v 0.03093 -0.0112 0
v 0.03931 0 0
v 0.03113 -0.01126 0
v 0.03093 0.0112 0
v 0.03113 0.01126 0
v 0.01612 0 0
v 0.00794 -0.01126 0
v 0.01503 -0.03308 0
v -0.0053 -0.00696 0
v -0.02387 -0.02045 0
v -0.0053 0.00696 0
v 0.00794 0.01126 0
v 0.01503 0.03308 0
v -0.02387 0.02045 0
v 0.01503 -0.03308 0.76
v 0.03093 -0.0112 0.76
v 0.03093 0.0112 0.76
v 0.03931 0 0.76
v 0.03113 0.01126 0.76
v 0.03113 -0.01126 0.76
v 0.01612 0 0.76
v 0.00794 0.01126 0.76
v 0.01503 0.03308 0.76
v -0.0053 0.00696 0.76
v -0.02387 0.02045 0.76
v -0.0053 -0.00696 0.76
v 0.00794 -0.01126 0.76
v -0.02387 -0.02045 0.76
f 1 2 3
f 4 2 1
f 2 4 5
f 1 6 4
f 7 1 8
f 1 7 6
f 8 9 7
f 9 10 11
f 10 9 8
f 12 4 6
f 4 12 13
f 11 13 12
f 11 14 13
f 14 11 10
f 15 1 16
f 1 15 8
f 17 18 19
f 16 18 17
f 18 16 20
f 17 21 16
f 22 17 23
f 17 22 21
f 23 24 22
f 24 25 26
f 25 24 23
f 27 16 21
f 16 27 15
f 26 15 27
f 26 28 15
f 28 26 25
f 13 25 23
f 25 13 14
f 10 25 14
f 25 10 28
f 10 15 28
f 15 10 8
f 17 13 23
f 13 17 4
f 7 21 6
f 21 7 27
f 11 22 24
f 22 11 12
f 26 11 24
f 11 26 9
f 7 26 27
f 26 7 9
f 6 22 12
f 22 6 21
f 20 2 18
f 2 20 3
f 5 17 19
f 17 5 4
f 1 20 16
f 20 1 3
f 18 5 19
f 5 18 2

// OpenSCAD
EPS = 0.01;

module loop0() {
    translate([0.035526315789473684, 0, 0])
    circle(r=0.034786184210526316);
}

module loop1() {
    translate([0.035526315789473684, 0, 0])
    circle(r=0.011842105263157895);
}

module loop2() {
    translate([0.011842105263157895, 0, 0])
    circle(r=0.011842105263157895);
}

module solid0() {
    difference() {
        linear_extrude(height=0.75 + EPS)
        loop0();
        linear_extrude(height=0.75 + EPS)
        loop1();
    }
}

module solid1() {
    linear_extrude(height=0.75 + EPS)
    loop2();
}

translate([-0.03125, 0, 0])
union() {
    solid0();
    translate([0.015625 - (-0.03125), 0, 0])
    solid1();
}
